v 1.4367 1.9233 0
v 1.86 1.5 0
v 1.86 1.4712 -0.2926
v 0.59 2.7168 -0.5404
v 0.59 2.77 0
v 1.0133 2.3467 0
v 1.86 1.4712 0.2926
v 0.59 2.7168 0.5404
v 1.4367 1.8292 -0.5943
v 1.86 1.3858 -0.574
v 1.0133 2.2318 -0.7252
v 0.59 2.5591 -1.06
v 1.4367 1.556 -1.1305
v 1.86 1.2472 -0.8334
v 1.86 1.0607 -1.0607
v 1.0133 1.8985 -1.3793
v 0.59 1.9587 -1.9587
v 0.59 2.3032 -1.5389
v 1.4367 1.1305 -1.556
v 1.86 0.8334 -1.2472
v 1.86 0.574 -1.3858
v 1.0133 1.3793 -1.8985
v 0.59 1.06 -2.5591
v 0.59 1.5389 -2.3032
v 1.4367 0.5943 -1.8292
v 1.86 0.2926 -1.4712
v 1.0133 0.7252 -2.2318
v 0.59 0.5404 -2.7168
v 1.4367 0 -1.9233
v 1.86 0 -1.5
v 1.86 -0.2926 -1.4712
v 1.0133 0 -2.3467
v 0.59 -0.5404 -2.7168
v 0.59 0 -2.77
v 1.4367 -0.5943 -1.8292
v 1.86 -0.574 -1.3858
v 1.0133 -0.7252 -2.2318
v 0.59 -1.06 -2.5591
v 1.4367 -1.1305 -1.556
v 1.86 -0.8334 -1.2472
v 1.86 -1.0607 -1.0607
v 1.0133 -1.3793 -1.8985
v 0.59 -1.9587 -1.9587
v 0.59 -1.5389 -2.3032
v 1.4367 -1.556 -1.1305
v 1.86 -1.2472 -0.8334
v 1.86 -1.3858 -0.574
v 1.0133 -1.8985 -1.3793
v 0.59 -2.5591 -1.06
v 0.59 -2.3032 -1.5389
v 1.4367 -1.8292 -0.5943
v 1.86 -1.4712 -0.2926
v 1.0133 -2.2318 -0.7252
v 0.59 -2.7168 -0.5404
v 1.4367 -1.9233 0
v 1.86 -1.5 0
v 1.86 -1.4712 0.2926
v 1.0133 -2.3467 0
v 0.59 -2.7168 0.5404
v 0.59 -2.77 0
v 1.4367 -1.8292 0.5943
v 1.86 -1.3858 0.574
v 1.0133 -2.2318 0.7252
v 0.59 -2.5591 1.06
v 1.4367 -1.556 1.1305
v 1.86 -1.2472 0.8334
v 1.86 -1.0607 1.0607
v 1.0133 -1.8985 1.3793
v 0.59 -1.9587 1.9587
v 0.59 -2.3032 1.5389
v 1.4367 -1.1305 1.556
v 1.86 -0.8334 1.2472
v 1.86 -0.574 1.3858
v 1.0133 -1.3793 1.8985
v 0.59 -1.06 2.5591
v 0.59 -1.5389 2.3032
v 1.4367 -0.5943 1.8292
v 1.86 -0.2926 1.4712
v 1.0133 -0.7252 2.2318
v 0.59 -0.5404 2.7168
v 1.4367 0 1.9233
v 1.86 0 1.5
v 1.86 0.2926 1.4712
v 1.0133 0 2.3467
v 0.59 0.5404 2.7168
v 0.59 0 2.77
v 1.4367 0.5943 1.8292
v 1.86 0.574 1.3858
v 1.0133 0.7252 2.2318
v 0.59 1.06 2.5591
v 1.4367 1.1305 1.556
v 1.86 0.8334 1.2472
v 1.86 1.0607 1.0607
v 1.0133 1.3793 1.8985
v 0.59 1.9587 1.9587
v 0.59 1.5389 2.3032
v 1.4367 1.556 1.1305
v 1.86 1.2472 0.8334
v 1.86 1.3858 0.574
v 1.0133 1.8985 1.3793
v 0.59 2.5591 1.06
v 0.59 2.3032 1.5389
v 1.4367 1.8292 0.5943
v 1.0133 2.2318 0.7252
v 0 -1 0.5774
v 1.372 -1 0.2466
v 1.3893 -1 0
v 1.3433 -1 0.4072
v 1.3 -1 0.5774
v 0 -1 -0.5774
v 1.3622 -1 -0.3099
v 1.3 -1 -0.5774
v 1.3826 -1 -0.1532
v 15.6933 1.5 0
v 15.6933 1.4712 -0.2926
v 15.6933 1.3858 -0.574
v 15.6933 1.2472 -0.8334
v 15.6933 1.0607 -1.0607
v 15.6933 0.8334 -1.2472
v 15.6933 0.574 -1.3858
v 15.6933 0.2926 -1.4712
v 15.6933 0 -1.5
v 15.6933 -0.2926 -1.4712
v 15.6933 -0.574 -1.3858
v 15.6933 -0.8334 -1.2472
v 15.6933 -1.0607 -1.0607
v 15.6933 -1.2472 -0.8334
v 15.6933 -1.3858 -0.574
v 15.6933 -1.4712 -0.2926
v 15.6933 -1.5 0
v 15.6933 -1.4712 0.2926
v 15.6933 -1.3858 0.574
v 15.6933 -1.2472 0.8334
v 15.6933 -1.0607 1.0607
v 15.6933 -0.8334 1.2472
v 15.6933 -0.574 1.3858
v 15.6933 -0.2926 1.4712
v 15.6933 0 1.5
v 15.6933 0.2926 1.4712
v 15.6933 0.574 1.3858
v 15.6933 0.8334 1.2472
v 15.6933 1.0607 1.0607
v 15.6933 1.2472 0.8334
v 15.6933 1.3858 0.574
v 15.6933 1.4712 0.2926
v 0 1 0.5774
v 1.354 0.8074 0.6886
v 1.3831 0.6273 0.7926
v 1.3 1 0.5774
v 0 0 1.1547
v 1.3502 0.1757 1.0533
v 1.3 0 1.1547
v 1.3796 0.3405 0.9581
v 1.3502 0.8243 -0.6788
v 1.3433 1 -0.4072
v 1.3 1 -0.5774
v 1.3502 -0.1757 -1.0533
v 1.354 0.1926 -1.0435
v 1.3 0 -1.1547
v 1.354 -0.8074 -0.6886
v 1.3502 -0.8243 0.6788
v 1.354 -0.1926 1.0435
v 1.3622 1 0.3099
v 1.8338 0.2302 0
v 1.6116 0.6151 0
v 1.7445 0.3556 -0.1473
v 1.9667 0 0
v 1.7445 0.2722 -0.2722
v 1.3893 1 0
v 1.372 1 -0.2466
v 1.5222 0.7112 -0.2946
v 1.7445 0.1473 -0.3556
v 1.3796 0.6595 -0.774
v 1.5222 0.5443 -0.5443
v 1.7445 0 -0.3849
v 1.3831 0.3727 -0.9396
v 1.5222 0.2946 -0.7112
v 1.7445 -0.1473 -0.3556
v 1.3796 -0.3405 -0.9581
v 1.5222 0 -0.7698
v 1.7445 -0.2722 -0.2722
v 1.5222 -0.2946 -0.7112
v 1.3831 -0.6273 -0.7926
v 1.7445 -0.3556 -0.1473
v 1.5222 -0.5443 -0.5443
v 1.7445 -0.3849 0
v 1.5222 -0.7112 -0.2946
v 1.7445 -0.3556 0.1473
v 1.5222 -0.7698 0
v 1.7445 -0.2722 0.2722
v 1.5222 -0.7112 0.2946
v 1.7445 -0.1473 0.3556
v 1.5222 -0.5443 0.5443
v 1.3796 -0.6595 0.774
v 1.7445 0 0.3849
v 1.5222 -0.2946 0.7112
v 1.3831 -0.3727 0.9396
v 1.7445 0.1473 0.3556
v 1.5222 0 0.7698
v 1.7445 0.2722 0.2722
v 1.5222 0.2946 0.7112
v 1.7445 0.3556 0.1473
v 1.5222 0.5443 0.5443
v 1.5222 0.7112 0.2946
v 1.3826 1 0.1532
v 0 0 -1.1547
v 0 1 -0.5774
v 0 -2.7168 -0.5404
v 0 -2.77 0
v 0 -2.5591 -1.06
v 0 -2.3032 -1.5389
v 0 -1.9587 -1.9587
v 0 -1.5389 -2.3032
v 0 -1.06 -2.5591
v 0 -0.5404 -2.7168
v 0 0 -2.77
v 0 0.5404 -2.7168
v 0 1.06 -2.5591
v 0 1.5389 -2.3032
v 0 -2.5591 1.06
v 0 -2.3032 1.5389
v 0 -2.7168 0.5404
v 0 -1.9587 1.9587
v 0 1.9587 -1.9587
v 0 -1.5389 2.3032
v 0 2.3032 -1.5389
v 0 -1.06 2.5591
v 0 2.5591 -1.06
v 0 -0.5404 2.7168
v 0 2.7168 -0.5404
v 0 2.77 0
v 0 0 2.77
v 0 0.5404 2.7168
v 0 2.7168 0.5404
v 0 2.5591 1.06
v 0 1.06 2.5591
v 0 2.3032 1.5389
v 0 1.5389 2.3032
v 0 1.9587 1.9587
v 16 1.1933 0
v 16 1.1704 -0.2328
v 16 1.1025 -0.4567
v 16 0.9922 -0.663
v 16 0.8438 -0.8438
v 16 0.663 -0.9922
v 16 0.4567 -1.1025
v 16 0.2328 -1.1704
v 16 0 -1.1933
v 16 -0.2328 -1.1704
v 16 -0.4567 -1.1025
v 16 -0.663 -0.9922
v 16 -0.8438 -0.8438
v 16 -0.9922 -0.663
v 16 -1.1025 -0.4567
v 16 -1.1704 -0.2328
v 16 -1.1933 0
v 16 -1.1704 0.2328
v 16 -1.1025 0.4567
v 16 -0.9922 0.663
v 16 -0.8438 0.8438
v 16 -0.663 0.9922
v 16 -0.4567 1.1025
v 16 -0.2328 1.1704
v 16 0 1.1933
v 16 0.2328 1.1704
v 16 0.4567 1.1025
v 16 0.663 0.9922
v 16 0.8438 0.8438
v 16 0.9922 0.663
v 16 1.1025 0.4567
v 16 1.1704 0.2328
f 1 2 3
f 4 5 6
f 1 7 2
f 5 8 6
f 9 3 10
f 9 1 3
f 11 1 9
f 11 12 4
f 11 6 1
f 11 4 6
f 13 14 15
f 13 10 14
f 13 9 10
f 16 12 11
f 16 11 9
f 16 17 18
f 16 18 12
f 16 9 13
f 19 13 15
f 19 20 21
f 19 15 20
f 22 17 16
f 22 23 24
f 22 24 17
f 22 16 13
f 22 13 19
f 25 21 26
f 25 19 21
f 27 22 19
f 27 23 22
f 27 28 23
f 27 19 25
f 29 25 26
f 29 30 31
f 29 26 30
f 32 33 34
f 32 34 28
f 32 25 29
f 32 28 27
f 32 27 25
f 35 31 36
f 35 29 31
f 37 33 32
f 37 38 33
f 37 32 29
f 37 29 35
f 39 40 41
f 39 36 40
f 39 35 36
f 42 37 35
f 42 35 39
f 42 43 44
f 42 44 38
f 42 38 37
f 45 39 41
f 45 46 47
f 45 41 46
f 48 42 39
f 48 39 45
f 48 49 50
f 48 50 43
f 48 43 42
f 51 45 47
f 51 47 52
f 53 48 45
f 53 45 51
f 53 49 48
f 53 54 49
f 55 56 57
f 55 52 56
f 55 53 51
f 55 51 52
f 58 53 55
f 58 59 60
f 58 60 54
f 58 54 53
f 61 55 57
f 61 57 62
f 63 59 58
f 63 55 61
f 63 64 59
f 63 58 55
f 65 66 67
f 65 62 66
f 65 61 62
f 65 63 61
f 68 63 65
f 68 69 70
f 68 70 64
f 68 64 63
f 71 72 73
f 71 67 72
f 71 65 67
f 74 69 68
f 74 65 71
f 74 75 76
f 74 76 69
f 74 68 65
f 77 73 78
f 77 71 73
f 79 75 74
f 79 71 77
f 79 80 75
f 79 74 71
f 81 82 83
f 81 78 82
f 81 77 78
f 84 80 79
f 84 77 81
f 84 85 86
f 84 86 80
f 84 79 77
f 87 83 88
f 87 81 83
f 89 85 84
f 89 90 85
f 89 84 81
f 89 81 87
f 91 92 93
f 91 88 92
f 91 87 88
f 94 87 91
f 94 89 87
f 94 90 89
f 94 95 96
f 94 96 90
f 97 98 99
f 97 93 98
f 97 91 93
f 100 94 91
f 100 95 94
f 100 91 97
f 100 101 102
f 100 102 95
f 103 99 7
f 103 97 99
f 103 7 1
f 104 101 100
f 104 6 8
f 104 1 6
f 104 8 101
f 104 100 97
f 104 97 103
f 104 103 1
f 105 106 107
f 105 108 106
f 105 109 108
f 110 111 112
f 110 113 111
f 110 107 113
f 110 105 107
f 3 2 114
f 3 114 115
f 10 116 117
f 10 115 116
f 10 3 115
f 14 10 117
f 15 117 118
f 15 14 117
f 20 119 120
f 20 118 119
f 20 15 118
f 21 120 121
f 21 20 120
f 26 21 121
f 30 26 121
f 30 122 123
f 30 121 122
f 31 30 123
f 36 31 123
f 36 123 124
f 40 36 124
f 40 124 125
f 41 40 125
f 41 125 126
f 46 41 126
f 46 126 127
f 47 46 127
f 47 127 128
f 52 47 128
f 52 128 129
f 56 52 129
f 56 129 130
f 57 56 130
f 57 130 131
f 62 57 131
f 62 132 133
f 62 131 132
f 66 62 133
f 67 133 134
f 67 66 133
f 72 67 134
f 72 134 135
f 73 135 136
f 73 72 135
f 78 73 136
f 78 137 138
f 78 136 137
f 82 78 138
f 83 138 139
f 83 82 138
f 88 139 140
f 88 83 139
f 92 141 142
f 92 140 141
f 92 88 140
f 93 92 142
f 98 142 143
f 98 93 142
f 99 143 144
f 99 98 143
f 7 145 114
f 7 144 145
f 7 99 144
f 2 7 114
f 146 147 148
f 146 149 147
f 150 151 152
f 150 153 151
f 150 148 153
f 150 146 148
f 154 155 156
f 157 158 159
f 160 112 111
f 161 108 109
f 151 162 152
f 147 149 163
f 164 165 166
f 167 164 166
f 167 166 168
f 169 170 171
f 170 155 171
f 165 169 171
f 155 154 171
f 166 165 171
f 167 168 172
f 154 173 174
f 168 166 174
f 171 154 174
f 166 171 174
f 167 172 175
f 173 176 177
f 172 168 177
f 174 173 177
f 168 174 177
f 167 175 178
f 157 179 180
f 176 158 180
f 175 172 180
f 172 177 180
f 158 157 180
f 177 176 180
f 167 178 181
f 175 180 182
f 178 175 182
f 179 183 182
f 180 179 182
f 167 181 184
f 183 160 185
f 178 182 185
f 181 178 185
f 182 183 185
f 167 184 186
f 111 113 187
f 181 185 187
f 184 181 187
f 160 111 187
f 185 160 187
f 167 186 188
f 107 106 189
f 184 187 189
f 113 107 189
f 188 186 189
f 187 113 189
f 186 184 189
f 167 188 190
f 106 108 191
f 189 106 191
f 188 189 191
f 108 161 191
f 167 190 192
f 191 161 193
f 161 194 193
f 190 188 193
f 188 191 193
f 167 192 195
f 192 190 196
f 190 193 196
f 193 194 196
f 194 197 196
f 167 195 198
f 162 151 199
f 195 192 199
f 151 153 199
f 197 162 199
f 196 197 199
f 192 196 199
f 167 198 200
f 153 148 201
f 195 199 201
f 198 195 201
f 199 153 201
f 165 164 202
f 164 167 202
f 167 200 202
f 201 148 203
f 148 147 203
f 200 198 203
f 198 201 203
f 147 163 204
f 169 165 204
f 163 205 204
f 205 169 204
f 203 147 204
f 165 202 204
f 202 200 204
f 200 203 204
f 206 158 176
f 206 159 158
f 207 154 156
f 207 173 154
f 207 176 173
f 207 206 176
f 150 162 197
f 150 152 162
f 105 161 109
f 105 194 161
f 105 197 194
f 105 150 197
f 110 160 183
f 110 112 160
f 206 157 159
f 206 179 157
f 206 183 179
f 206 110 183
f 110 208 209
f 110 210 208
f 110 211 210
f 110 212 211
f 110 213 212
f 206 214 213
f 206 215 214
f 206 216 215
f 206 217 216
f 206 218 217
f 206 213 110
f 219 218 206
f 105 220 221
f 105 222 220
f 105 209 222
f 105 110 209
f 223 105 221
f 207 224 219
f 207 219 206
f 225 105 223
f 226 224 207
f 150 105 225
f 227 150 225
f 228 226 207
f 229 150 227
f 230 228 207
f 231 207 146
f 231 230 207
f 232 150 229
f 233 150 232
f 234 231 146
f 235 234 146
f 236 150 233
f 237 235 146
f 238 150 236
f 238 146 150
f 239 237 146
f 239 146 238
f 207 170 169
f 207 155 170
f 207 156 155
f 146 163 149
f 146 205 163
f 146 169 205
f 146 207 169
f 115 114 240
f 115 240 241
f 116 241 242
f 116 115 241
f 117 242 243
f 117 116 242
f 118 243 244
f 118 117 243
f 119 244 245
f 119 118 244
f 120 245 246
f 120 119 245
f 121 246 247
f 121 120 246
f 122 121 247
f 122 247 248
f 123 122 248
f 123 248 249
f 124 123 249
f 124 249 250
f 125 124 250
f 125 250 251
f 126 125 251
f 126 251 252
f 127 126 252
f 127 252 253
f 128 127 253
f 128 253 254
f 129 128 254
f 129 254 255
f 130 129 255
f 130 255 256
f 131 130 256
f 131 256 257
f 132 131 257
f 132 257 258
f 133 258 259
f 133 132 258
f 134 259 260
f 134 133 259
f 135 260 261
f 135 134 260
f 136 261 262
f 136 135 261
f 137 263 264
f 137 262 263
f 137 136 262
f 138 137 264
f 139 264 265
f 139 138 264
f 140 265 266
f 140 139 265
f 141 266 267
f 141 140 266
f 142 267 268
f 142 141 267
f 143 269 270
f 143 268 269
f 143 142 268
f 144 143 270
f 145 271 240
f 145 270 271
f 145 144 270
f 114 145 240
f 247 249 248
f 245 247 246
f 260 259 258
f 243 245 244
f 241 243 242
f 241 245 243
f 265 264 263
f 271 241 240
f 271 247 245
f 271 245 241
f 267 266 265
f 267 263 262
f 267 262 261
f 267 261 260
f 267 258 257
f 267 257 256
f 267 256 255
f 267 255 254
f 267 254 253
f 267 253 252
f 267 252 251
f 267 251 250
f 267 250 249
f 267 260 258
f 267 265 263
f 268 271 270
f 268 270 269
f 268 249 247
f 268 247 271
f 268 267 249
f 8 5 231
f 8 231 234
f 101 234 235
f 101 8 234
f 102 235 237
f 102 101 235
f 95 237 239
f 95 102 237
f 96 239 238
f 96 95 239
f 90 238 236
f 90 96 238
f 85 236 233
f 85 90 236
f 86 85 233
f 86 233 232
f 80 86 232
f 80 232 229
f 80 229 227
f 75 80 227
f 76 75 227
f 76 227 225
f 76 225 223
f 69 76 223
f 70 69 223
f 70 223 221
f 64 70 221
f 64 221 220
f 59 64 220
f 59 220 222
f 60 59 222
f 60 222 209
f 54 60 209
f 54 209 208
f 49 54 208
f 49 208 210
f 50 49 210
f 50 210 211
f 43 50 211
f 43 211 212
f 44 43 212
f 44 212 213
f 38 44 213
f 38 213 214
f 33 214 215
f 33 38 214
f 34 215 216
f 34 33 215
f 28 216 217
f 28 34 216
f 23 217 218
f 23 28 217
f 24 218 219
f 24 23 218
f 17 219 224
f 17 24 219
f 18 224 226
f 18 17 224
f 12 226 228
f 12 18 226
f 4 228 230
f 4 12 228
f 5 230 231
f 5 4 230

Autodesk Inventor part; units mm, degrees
ref_plane "YZ Plane" through (0, 0, 0) normal (1, 0, 0) x (0, 1, 0)
ref_plane "XZ Plane" through (0, 0, 0) normal (0, 1, 0) x (-1, 0, 0)
sketch "Sketch1" plane through (0, 0, 0) normal (0, 0, 1) x (1, 0, 0)
  line L0 (16, 0) -> (16, 1.5)
  line L1 (16, 1.5) -> (4, 1.5)
  line L2 (4, 1.5) -> (3.6933, 1.5)
  line L3 (0, 2.77) -> (0, 1.1547)
  line L4 (0, 1.1547) -> (1.3, 1.1547)
  line L5 (1.3, 1.1547) -> (1.9667, 0)
  line L6 (1.9667, 0) -> (16, 0)
  line L7 (0, 2.77) -> (0.59, 2.77)
  line L8 (0.59, 2.77) -> (1.86, 1.5)
  line L9 (3.6933, 1.5) -> (1.86, 1.5)
  line L10 (4, 1.5) -> (1.86, 1.5) construction
  line L11 (1.86, 1.5) -> (1.86, 1.5)
  line L12 (-3.2, 0) -> (19.2, 0) projected
  line L13 (0, -0.554) -> (0, 3.324) projected
  dimension "d0" = 16
  dimension "d1" = 12
  dimension "d2" = 1.3
  dimension "d3" = 3
  dimension "d6" = 1.86
  dimension "d7" = 45
  dimension "d8" = 2.3094
  dimension "d9" = 60
  dimension "d10" = 5.54
  dimension "d11" = 3
  dimension "d12" = 0.3067
revolve "Body" add sketch "Sketch1" angle 360 about axis through (1.9667, 0, 0) along (1, 0, 0) contours L6 L5 L4 L3 L7 L8 L9 L2 L1 L0
sketch "Sketch2" plane through (0, 0, 0) normal (-1, 0, 0) x (0, 0, 1)
  circle A0 centre (0, 0) radius 1.1547 projected
  line L0 (0, -3.878) -> (0, 3.878) projected
  line L1 (-3.878, 0) -> (3.878, 0) projected
  line L2 (1.1547, 0) -> (0.5774, -1)
  line L3 (0.5774, -1) -> (-0.5774, -1)
  line L4 (-0.5774, -1) -> (-1.1547, 0)
  line L5 (-1.1547, 0) -> (-0.5774, 1)
  line L6 (-0.5774, 1) -> (0.5774, 1)
  line L7 (0.5774, 1) -> (1.1547, 0)
  point P0 (0, 1.1547)
extrude "Slot" add sketch "Sketch2" against normal up to next contours L7 A0 | A0 L2 | L6 L0 A0 | A0 L0 L3 | L0 L6 A0 | A0 L3 L0 | L4 A0 | A0 L5
thread "Thread" size "M3x0.5" class "6g" standard "ISO Metric profile" length 12
chamfer "Chamfer1" distance 0.3067 distance2 0.3067 1 edges at (16, -1.5, 0) measured on face at (16, -0.3743, -0.3316)
ref_plane "Work Plane1" through (104.775, 0, 0) normal (0, 0, -1) x (1, 0, 0)
equation "\"d0\" = NLG"
equation "\"d1\" = GEL"
equation "\"d2\" = INTI"
equation "\"d3\" = GD"
equation "\"d6\" = KOH"
equation "\"d7\" = 0.5 * SEWI"
equation "\"d8\" = 1.1547 * SW"
equation "\"d10\" = KOD"
equation "\"d11\" = BDM"
equation "\"d12\" = GAL"
equation "\"d15\" = GEL"
equation "\"d17\" = -0.5 * SPD + 0.5 * GD"
equation "\"d18\" = GUL"
equation "\"NLG\" = 16"
equation "\"INTI\" = 1.3"
equation "\"GEL\" = 12"
equation "\"GAL\" = 0.61345 * PTC"
equation "\"KOH\" = 1.86"
equation "\"KOD\" = 5.54"
equation "\"GUL\" = 0.61345 * PTC"
equation "\"SPD\" = NND - 1.2269 * PTC"
equation "\"BDM\" = NND"
equation "\"GD\" = NND"
equation "\"SEWI\" = 90deg"
equation "\"SW\" = 2"
equation "\"TOA\" = 30deg"
equation "\"GD1\" = THREADDIA - 1.2269 * PTC"
equation "\"EPV\" = 3.36"
equation "\"THREADDIA\" = 3"
equation "\"PTC\" = 0.5"
equation "\"NND\" = 3"
equation "\"E0\" = 2.31"
equation "\"THREADDESC\" = 1.2345"
properties part number "M3 x  16 - Socket Csk Screw (A2)" material "Stainless Steel"
